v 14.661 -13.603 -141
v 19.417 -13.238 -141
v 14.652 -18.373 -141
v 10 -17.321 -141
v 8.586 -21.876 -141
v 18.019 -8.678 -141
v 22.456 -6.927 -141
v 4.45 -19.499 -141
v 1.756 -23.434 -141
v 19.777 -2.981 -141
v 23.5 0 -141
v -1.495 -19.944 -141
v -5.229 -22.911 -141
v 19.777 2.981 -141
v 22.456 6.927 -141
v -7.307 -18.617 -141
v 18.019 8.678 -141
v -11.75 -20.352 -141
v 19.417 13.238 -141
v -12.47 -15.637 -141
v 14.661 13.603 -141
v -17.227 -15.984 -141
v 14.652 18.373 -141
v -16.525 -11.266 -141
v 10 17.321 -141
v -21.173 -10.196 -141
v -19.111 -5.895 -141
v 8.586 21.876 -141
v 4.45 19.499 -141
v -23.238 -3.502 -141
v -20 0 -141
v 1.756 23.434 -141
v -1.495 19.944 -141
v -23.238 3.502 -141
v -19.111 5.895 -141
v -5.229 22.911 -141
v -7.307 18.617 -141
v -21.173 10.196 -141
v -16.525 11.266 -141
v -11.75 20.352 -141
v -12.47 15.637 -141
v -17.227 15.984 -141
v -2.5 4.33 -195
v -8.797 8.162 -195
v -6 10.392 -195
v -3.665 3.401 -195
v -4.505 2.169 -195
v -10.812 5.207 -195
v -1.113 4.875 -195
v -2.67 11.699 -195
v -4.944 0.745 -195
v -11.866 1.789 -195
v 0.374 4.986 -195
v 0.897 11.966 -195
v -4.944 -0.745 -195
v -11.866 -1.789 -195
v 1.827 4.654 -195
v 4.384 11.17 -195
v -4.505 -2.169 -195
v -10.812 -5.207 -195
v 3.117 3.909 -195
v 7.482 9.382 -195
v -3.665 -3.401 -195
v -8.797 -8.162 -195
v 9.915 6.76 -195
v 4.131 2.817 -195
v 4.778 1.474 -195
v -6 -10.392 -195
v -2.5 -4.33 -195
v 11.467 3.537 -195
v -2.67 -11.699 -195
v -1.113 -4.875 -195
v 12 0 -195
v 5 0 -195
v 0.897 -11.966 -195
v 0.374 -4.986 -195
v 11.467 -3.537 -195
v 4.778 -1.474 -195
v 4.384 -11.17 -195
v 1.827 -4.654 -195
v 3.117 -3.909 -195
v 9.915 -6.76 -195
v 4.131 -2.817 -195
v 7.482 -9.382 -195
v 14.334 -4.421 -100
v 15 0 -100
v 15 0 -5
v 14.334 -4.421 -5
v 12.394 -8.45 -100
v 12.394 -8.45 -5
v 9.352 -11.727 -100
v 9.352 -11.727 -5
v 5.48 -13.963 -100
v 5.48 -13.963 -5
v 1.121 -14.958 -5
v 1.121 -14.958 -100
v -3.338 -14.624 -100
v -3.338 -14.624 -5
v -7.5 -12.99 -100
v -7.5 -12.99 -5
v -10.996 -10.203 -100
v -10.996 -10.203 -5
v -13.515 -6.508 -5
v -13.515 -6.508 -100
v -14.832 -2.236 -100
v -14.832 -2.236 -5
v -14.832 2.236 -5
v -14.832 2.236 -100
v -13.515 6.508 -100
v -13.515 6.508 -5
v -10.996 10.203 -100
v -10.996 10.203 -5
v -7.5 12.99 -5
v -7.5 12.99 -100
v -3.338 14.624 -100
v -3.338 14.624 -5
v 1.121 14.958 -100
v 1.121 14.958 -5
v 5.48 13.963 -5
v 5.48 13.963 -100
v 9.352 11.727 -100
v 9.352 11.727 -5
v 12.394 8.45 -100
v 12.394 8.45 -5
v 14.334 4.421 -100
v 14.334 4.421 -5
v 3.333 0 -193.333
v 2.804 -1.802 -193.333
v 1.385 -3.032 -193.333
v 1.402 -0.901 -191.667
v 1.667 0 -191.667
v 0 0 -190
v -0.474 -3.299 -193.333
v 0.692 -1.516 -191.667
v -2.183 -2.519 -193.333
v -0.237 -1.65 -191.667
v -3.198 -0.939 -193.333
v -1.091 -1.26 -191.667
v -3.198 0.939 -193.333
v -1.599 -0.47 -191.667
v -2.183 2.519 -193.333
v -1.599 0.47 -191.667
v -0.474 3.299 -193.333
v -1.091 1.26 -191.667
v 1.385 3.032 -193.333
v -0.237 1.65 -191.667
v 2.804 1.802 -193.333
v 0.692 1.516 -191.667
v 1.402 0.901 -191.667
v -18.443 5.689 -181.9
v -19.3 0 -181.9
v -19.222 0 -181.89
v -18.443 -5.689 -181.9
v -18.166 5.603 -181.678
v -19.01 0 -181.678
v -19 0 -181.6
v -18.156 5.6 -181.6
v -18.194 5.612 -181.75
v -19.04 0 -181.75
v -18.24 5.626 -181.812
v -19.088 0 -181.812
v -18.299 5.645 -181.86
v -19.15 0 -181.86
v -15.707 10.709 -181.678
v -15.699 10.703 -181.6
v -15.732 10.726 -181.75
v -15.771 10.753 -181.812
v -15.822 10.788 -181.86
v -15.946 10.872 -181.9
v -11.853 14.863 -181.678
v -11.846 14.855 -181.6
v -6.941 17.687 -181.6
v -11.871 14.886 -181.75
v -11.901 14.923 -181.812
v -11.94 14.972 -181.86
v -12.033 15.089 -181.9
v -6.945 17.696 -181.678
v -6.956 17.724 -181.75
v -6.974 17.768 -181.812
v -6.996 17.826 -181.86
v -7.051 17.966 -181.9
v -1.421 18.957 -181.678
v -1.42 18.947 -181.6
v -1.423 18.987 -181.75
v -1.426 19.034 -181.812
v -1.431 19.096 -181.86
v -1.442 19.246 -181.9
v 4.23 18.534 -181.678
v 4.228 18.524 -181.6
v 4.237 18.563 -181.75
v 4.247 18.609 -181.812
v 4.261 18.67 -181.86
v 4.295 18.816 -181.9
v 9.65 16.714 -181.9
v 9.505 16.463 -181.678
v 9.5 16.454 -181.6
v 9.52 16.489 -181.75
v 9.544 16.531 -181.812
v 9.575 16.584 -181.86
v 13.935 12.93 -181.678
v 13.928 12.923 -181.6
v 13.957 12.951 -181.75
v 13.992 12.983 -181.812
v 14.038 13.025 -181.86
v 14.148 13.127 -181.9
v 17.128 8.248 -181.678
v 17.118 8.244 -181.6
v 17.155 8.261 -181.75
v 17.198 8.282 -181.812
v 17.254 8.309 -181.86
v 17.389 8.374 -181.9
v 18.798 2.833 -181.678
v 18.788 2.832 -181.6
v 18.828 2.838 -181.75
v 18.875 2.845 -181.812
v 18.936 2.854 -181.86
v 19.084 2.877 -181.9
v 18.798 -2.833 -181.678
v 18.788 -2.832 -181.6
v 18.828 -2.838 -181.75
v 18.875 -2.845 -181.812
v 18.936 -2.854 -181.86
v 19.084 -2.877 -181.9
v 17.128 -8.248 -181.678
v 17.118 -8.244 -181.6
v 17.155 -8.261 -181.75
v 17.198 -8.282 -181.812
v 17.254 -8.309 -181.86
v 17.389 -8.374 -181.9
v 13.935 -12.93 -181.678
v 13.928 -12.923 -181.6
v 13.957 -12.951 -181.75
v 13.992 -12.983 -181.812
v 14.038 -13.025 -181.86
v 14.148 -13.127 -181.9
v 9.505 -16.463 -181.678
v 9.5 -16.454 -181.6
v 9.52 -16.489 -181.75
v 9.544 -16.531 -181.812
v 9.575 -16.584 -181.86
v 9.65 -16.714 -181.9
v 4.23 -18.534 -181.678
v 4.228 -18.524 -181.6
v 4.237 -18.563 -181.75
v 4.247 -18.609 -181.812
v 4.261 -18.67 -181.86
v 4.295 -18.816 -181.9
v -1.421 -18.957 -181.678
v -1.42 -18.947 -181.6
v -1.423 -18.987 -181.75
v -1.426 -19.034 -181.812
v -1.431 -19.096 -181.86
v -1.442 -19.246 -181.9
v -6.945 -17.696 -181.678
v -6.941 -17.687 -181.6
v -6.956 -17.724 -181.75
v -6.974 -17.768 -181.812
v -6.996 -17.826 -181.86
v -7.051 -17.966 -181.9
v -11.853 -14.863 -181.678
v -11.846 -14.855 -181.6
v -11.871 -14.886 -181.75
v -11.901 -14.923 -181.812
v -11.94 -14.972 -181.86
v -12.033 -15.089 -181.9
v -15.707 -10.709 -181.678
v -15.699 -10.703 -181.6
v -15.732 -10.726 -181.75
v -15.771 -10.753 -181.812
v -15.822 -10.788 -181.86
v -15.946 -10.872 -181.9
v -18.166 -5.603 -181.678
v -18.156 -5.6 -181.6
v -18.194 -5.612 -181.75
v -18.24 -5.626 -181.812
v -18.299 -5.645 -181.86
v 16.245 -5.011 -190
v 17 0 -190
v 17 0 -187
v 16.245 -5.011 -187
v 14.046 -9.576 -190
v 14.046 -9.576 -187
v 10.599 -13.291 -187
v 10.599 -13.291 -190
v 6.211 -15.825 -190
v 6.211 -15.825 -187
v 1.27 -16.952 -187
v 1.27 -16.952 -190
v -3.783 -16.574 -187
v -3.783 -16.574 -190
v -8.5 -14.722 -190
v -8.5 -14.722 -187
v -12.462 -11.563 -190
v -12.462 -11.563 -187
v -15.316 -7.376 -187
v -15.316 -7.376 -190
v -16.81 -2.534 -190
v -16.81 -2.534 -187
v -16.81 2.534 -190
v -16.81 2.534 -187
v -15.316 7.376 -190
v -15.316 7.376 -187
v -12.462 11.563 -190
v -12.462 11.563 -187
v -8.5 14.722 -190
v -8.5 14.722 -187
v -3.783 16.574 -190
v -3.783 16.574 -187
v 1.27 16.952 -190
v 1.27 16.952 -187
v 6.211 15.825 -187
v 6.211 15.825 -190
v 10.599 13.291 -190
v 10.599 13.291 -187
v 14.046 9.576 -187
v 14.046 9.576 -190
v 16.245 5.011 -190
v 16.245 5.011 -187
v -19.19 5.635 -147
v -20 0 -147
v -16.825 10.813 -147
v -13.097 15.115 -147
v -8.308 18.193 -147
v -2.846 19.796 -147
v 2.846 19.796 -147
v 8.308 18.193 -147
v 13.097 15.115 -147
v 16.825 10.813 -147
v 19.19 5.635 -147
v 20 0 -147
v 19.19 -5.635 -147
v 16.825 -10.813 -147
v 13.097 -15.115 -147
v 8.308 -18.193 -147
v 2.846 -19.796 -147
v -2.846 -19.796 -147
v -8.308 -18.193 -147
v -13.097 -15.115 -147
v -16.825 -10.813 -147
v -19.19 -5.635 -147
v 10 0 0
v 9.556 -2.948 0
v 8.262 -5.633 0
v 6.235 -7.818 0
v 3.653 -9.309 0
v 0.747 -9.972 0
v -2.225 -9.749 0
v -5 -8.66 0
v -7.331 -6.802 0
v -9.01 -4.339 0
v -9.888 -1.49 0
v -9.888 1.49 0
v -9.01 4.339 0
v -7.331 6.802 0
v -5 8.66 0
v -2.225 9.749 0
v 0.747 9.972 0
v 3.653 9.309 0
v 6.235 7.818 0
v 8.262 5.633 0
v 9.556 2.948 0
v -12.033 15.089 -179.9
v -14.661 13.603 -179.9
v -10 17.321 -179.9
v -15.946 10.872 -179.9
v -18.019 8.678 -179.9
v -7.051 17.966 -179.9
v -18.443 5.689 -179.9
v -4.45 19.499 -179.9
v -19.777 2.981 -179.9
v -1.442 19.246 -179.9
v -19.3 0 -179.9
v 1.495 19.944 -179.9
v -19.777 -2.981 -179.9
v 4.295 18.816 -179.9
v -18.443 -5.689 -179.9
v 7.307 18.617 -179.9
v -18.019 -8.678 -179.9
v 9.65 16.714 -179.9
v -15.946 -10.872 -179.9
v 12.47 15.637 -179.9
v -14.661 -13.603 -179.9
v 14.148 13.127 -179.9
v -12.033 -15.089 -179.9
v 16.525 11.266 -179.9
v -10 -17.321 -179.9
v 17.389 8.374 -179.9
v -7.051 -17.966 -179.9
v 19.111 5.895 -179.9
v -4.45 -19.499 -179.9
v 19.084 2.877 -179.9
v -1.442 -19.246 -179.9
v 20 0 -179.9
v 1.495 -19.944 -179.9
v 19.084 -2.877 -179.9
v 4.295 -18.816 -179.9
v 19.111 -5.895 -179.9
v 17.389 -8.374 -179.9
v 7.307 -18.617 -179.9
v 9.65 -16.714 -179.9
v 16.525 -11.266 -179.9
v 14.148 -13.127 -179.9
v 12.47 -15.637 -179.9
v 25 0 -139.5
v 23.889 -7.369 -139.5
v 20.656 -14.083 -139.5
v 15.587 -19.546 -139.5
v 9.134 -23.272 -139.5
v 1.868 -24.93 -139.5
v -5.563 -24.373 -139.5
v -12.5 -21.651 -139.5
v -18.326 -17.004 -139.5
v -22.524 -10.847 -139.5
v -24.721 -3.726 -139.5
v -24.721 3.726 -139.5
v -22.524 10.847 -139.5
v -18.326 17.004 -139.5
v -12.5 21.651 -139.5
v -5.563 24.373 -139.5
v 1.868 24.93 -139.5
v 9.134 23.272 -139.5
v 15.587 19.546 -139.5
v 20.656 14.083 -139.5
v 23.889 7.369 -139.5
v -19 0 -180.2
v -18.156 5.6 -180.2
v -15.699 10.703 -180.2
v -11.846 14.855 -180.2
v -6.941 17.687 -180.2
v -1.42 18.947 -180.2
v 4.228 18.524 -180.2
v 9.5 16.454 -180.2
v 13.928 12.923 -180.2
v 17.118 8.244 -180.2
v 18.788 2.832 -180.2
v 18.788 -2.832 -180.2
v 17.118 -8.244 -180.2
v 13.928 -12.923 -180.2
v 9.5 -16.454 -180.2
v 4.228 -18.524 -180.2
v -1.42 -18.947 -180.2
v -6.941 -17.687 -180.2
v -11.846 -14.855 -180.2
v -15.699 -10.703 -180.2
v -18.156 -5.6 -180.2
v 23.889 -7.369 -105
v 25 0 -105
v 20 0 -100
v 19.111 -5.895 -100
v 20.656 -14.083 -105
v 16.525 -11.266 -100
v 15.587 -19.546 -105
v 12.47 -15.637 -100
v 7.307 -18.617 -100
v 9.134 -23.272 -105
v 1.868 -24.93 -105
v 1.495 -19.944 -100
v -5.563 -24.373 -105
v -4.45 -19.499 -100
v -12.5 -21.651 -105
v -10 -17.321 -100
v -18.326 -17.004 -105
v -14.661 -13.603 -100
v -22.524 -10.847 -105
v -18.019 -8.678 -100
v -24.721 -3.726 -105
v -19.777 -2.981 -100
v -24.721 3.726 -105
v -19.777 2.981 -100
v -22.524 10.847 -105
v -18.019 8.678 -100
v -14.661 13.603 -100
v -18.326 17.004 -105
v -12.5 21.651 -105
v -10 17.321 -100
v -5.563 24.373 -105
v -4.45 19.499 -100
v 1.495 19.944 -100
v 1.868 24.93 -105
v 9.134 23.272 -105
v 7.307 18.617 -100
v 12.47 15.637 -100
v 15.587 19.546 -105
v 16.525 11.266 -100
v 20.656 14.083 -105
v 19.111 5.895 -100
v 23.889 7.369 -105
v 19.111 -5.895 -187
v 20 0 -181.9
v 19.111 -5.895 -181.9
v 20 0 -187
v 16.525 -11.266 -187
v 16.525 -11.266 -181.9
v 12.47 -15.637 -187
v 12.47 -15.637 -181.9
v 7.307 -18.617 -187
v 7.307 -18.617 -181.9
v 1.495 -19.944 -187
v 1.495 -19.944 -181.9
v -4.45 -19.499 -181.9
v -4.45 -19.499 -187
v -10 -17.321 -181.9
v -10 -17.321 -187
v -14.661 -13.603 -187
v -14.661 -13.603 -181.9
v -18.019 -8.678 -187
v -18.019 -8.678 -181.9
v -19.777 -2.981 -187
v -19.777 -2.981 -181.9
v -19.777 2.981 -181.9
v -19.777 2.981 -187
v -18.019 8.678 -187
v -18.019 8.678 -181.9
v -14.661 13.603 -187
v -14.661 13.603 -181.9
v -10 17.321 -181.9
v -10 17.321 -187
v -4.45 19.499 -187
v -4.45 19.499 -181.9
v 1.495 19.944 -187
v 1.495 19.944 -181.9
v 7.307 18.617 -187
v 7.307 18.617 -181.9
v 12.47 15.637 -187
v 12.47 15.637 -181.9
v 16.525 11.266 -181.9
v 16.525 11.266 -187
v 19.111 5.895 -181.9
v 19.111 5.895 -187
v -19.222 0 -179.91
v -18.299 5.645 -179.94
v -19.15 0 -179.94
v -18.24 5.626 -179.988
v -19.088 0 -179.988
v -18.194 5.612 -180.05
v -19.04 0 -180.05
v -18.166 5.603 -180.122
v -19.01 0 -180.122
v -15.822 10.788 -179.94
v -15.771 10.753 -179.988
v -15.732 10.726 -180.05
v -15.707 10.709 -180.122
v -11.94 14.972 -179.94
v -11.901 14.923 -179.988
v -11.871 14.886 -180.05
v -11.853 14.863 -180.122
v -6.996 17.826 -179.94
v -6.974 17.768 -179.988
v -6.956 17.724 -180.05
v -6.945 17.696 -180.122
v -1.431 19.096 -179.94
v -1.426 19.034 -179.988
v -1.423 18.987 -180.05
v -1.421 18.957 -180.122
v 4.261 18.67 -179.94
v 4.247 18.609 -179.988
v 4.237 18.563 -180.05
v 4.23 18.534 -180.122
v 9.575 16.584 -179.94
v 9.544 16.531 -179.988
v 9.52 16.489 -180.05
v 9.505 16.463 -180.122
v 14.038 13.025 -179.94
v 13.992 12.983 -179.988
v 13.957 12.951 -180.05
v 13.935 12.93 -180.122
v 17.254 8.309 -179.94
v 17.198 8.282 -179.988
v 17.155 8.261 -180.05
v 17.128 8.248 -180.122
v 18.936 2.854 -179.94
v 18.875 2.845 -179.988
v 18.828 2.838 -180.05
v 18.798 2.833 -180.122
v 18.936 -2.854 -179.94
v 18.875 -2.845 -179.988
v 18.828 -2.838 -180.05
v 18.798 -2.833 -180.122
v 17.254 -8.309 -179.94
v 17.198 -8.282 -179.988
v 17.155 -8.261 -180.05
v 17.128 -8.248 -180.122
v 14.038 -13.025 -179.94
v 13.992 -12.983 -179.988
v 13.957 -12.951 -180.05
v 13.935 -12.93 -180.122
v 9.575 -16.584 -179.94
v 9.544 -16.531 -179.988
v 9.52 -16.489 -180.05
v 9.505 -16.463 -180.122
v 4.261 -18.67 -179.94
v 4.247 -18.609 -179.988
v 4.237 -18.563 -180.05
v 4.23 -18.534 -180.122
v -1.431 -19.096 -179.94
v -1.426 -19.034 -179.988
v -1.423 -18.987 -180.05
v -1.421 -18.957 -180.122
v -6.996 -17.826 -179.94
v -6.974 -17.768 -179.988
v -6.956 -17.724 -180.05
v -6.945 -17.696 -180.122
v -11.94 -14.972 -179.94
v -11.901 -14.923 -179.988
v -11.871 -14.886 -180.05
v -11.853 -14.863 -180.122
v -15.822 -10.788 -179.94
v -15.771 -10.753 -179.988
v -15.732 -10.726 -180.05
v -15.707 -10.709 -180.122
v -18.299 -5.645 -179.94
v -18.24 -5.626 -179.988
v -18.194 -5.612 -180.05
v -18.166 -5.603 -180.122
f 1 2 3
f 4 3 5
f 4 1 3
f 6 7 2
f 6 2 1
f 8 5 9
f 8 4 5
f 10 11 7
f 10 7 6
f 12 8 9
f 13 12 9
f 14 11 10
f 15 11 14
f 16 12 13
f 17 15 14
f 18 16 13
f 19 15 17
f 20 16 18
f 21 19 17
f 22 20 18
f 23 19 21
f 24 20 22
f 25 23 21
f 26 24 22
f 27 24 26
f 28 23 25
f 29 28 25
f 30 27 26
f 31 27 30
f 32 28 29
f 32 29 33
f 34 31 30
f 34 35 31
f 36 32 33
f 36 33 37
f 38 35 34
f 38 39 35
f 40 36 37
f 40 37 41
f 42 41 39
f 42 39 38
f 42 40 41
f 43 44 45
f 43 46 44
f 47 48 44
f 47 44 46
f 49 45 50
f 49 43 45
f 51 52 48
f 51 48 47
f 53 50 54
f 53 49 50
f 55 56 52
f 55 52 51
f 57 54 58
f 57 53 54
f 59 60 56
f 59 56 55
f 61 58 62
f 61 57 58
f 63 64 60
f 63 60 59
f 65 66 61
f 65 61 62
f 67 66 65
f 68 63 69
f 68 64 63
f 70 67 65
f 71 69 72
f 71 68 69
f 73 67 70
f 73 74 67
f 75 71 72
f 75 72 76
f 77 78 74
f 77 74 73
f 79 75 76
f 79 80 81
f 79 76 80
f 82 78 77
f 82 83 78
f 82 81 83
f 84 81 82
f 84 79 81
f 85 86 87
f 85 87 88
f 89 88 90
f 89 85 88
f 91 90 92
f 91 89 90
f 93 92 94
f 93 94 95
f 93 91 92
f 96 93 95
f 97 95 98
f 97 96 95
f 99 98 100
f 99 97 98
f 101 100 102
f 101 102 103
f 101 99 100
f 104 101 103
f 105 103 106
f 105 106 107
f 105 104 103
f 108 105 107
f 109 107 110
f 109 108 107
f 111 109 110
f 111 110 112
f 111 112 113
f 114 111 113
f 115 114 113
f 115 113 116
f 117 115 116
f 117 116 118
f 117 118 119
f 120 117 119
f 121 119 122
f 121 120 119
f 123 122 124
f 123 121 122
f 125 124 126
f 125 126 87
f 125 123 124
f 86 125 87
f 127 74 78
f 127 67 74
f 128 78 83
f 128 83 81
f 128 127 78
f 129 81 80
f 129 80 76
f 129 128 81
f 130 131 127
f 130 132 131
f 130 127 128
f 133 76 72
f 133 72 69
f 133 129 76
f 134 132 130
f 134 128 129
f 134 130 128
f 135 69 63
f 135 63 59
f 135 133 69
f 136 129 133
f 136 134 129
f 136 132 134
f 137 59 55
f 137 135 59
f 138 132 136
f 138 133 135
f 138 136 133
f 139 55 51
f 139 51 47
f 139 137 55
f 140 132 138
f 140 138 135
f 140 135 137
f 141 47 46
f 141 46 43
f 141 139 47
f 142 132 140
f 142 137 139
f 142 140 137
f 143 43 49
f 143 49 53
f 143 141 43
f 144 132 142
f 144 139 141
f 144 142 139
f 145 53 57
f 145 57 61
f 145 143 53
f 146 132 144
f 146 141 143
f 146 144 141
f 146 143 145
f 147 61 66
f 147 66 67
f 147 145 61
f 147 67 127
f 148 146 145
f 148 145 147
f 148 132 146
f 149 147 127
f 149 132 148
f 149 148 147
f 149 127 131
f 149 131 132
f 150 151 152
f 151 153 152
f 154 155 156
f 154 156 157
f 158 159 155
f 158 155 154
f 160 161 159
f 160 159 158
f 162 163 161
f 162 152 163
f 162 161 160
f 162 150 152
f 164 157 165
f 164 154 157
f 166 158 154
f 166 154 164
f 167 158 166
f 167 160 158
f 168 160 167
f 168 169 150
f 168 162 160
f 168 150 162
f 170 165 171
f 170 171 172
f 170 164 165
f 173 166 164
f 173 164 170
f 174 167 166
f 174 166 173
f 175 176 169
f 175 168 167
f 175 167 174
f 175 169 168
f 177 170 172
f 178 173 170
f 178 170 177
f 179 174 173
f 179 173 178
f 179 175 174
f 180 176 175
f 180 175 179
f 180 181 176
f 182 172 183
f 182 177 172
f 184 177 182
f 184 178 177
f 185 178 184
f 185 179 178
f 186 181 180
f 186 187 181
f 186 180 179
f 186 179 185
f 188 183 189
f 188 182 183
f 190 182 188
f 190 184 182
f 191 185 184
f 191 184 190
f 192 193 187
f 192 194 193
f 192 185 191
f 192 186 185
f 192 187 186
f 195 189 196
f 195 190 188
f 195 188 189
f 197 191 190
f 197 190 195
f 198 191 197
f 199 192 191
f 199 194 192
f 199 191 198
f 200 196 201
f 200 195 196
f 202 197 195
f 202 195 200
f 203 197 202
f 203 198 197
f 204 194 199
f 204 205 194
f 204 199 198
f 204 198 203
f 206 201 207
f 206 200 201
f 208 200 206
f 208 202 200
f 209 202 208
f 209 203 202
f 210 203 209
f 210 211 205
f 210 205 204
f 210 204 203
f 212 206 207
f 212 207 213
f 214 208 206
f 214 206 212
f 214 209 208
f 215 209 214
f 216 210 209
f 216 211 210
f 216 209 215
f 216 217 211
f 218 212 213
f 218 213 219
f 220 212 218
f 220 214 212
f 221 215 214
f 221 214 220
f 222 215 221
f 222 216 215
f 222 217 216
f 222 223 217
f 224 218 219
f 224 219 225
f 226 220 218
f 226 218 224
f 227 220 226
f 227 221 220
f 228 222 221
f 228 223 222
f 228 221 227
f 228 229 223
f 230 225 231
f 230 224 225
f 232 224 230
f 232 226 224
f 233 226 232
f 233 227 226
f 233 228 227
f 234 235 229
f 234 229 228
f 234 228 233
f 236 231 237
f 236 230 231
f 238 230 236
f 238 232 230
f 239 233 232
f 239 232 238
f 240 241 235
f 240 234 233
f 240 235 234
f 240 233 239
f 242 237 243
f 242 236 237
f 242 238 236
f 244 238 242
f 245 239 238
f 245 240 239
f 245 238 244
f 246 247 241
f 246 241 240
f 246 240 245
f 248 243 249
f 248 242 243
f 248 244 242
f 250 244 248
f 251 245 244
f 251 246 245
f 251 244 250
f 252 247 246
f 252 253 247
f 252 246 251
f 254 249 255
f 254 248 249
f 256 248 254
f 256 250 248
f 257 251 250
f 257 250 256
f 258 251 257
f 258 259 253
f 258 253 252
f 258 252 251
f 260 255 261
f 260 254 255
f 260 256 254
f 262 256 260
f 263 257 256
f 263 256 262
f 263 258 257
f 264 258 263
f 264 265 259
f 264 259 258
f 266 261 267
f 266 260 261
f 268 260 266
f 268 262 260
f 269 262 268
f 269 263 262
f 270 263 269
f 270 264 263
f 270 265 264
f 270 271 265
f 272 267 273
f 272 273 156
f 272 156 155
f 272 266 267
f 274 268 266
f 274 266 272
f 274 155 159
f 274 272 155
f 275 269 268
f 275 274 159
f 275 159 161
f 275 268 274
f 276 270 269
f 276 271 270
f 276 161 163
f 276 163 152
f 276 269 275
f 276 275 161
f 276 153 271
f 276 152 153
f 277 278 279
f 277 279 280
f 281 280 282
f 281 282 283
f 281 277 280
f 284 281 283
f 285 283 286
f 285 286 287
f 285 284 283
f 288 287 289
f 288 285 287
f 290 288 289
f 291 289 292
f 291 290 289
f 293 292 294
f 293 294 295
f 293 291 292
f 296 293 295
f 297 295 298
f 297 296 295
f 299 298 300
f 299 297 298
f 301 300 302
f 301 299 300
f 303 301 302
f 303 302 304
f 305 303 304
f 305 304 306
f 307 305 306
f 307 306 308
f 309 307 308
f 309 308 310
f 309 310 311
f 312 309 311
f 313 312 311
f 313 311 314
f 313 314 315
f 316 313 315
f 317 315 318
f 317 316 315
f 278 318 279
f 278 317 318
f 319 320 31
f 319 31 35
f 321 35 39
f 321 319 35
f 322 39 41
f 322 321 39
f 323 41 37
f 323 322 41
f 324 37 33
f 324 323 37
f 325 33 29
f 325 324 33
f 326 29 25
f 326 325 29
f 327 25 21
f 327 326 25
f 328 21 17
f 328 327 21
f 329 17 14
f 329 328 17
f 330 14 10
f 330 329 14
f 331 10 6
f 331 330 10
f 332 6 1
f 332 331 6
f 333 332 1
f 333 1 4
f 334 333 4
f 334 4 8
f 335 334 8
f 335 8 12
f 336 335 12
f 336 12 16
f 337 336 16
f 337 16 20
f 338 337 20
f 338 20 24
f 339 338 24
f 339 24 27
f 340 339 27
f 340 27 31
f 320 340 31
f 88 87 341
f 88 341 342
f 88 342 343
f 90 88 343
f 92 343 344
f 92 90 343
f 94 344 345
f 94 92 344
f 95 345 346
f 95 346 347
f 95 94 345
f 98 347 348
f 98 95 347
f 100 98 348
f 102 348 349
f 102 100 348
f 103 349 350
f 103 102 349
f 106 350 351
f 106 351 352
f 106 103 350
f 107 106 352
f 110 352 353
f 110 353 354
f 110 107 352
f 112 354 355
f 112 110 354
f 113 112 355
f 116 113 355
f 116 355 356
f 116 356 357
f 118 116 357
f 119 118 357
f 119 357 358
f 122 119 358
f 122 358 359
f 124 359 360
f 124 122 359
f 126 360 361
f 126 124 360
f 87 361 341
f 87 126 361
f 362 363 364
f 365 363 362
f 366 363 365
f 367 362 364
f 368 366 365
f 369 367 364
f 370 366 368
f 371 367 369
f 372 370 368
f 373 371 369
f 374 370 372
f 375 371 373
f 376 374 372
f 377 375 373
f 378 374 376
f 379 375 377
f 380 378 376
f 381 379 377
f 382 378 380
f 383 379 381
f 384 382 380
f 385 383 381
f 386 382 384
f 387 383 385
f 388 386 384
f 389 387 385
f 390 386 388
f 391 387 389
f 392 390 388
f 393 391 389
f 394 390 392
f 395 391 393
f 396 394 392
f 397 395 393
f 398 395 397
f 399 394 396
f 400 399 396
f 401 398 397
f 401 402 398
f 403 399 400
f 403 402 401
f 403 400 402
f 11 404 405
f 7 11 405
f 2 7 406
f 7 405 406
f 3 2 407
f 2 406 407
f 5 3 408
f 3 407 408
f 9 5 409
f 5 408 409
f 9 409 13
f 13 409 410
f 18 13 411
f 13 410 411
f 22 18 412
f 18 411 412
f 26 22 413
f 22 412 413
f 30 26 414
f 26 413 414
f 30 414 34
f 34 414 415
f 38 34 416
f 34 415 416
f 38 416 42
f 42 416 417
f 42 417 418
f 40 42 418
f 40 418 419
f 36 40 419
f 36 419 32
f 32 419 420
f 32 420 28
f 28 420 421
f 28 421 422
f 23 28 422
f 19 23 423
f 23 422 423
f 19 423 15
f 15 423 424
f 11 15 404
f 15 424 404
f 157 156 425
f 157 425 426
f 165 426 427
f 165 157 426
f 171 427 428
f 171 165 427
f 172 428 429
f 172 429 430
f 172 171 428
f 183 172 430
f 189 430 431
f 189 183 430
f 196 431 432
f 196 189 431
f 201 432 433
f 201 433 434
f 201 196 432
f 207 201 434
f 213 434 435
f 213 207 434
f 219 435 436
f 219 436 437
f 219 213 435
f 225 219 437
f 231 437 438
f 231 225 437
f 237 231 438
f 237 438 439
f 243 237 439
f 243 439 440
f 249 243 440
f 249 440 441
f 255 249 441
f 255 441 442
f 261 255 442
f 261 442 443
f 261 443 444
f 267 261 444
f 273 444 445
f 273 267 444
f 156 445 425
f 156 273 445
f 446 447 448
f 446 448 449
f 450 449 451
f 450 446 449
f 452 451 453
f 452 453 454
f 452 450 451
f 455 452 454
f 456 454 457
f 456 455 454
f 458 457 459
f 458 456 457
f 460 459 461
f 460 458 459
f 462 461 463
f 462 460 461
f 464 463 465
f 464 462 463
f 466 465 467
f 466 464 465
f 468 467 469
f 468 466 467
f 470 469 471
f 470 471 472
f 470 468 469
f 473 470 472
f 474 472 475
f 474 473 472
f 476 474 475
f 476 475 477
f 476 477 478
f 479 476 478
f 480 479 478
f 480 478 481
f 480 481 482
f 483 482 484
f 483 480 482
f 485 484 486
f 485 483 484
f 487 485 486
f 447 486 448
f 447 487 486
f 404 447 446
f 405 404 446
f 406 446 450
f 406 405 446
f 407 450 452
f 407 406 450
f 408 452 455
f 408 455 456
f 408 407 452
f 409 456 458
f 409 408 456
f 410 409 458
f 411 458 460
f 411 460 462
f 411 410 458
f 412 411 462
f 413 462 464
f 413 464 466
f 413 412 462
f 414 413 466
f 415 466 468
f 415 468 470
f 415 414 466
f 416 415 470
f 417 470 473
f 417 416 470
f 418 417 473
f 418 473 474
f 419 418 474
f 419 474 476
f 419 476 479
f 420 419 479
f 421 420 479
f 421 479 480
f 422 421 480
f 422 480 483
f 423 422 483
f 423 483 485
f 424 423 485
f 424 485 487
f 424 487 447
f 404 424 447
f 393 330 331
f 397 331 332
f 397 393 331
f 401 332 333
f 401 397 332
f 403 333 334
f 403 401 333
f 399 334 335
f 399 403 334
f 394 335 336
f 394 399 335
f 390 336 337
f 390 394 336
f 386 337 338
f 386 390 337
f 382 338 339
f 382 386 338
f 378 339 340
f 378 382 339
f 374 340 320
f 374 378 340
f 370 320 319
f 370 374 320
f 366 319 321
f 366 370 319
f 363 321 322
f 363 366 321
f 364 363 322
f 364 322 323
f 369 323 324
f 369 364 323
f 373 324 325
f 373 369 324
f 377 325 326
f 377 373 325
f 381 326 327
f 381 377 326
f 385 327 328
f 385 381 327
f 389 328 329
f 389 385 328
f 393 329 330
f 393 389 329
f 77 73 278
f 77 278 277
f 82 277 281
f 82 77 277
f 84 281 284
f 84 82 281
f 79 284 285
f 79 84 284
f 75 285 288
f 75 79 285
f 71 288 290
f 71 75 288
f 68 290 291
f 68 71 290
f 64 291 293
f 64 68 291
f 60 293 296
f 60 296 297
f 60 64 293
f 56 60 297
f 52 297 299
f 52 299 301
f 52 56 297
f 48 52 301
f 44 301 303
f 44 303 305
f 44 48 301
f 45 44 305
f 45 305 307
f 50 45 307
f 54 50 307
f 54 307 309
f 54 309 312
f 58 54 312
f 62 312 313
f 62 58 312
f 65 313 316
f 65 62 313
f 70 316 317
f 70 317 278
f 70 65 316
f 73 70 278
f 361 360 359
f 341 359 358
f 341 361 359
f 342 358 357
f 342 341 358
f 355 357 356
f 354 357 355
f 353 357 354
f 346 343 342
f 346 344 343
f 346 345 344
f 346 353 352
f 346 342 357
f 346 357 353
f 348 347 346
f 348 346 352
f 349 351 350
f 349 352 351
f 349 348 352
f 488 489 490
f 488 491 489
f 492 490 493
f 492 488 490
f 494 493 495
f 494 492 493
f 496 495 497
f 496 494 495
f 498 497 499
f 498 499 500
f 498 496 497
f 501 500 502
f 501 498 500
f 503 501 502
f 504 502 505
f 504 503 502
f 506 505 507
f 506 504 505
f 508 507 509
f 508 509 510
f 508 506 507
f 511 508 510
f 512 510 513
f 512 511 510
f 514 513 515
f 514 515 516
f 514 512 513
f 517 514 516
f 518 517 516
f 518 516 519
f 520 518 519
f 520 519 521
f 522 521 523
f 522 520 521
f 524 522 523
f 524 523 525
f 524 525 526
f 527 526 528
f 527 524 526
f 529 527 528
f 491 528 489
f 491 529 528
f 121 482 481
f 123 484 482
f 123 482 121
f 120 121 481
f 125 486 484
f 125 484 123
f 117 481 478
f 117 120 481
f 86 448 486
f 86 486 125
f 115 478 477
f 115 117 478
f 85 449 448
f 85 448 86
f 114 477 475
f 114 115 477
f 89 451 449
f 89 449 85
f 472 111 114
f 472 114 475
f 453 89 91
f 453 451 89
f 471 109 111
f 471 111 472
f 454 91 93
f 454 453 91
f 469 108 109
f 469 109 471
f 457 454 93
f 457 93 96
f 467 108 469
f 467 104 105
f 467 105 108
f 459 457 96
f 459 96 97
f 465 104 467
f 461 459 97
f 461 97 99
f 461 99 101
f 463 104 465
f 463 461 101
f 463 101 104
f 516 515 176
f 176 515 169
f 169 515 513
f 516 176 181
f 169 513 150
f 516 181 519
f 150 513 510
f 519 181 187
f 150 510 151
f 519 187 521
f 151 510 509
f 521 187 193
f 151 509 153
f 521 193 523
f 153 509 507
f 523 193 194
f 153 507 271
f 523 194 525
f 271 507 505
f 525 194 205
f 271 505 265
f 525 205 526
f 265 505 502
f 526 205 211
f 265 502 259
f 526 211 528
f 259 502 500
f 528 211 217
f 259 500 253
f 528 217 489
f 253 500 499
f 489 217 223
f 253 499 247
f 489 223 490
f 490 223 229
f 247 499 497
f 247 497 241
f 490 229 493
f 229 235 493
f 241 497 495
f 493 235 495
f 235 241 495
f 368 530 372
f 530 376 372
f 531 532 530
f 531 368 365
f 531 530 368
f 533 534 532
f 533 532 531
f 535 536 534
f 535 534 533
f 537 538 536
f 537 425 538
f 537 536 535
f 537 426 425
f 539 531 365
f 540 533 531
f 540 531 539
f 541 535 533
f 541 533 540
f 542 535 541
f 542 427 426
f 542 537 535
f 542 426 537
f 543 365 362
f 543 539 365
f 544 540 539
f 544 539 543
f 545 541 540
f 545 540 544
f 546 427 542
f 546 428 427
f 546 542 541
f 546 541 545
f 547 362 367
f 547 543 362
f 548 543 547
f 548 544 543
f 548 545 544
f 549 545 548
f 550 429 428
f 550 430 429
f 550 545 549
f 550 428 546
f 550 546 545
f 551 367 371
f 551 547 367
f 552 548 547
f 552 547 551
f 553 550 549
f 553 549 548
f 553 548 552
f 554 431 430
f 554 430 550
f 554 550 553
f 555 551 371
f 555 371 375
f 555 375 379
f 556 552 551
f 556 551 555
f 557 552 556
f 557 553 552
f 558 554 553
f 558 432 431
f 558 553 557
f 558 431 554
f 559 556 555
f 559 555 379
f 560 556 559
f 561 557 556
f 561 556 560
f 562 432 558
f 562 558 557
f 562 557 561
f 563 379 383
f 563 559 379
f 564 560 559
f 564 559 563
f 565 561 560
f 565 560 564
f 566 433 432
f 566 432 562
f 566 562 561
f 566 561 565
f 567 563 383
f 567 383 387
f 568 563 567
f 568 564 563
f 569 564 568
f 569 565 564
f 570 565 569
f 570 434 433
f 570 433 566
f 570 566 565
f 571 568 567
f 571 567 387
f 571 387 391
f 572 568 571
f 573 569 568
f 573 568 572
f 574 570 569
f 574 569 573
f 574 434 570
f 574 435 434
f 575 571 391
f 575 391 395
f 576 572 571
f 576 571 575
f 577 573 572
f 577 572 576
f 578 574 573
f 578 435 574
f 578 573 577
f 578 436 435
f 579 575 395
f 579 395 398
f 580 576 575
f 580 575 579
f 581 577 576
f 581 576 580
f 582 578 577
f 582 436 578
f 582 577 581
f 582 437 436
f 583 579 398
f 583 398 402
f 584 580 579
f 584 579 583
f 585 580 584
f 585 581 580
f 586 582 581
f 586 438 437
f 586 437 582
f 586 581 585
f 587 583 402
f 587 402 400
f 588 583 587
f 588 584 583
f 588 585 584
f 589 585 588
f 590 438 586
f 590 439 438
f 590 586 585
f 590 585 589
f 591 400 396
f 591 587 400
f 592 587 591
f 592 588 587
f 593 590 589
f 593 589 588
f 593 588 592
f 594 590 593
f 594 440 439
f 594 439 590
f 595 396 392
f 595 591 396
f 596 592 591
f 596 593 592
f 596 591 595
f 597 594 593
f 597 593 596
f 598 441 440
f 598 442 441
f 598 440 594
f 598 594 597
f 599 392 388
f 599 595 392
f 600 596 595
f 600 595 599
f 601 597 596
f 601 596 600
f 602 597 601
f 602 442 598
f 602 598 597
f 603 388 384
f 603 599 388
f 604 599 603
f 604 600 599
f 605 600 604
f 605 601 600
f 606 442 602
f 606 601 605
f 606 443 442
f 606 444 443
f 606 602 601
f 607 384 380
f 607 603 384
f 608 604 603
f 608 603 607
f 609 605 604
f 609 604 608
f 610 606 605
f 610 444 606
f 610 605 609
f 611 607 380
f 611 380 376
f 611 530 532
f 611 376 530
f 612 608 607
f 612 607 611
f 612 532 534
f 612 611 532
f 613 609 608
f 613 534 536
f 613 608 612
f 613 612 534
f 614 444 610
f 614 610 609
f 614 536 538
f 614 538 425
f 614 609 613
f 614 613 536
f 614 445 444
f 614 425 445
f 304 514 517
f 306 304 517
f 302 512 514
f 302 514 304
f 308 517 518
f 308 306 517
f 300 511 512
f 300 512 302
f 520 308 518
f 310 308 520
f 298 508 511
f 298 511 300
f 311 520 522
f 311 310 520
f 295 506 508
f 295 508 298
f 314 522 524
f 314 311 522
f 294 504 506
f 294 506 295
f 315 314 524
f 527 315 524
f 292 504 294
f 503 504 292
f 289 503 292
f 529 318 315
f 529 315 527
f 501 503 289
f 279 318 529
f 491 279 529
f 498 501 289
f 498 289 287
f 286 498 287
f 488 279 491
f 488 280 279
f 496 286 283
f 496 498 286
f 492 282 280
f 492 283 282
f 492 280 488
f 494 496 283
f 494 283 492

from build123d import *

# Parameters (mm, degrees)
CHAMFER_1_SIZE      = 5
SKETCH_4_R          = 20
SKETCH_4_R_2        = 19
CUT_EXTRUDE_1_DEPTH = 2
FILLET_1_R          = 0.3
CHAMFER_2_SIZE      = 1.5
SKETCH_9_R          = 25
SKETCH_9_R_2        = 20
CUT_EXTRUDE_4_DEPTH = 6
CHAMFER_3_SIZE      = 1.5


with BuildPart() as part:
    # Эскиз1 → Повернуть1 (revolve)
    with BuildSketch(Plane(origin=(0, 0, 0), x_dir=(0, 0, -1), z_dir=(1, 0, 0))):
        Polygon((0, 0), (0, 15), (100, 15), (100, 25), (147, 25), (147, 20), (187, 20), (187, 17), (195, 17), (195, 5), (190, 0), align=None)
    revolve(axis=Axis((0, 0, 0), (0, 0, -1)))

    # Фаска1
    chamfer_1_edges = [part.edges().sort_by_distance(p)[0] for p in [
        (0, -25, -100),
        (0, -15, 0),
        (0, -17, -195),
    ]]
    chamfer(chamfer_1_edges, length=CHAMFER_1_SIZE)

    # Эскиз4 → Вырез-Вытянуть1 (cut)
    with BuildSketch(Plane(origin=(0, 0, -181.9), x_dir=(-1, 0, 0), z_dir=(0, 0, -1))):
        Circle(SKETCH_4_R)
        Circle(SKETCH_4_R_2, mode=Mode.SUBTRACT)
    extrude(amount=-CUT_EXTRUDE_1_DEPTH, mode=Mode.SUBTRACT)

    # Скругление1
    fillet_1_edges = [part.edges().sort_by_distance(p)[0] for p in [
        (19, 0, -179.9),
        (19, 0, -181.9),
    ]]
    fillet(fillet_1_edges, radius=FILLET_1_R)

    # Фаска2
    chamfer_2_edges = [part.edges().sort_by_distance(p)[0] for p in [
        (0, -25, -147),
    ]]
    chamfer(chamfer_2_edges, length=CHAMFER_2_SIZE)

    # Эскиз9 → Вырез-Вытянуть4 (cut)
    with BuildSketch(Plane(origin=(0, 0, -147), x_dir=(-1, 0, 0), z_dir=(0, 0, -1))):
        Circle(SKETCH_9_R)
        Circle(SKETCH_9_R_2, mode=Mode.SUBTRACT)
    extrude(amount=-CUT_EXTRUDE_4_DEPTH, mode=Mode.SUBTRACT)

    # Фаска3
    chamfer_3_edges = [part.edges().sort_by_distance(p)[0] for p in [
        (0, -25, -141),
    ]]
    chamfer(chamfer_3_edges, length=CHAMFER_3_SIZE)


solid = part.part
